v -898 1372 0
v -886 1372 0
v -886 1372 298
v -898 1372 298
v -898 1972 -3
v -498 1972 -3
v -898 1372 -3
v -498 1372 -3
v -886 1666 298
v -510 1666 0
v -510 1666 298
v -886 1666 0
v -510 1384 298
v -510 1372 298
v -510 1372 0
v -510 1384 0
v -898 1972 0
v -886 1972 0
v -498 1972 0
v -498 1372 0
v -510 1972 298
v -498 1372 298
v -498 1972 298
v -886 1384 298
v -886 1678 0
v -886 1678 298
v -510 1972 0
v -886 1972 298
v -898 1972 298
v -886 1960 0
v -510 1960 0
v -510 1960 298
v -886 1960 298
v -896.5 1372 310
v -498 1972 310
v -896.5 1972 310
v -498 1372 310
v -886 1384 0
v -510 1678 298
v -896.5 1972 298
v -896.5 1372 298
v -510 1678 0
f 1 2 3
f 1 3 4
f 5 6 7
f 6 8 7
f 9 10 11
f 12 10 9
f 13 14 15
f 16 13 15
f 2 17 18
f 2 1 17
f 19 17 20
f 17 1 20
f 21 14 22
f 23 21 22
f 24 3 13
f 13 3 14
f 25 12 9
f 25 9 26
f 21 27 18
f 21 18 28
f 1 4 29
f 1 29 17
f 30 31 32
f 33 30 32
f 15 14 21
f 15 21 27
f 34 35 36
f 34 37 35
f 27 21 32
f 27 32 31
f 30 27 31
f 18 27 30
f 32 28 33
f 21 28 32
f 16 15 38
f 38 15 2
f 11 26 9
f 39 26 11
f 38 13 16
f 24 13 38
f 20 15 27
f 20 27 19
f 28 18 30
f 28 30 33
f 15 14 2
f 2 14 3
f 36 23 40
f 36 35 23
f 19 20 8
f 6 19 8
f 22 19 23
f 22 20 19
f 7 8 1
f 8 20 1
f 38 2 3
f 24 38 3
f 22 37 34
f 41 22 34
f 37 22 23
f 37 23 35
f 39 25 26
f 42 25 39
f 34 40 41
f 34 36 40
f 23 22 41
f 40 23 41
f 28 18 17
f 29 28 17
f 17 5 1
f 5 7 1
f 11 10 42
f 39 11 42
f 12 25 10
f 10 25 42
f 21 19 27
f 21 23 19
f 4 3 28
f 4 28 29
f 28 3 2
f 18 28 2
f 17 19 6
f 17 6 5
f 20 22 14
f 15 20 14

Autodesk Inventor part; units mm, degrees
ref_plane "YZ Plane" through (0, 0, 0) normal (1, 0, 0) x (0, 1, 0)
sketch "Sketch1" plane through (0, 0, 0) normal (0, 0, 1) x (1, 0, 0)
  line L0 (-1498, 0) -> (1498, 0) construction
  line L1 (-1498, 0) -> (-898, 0)
  line L2 (-898, 0) -> (-898, 2068)
  line L3 (-898, 2068) -> (-1498, 2068)
  line L4 (-1498, 2068) -> (-1498, 0)
  line L5 (-898, 0) -> (-498, 0)
  line L6 (-498, 0) -> (-498, 816)
  line L7 (-498, 816) -> (-898, 816)
  line L8 (-898, 816) -> (-898, 0)
  line L9 (-498, 0) -> (102, 0)
  line L10 (102, 0) -> (102, 816)
  line L11 (102, 816) -> (-498, 816)
  line L12 (-498, 816) -> (-498, 0)
  line L13 (102, 0) -> (698, 0)
  line L14 (698, 0) -> (698, 668)
  line L15 (698, 668) -> (102, 668)
  line L16 (102, 668) -> (102, 0)
  line L17 (698, 0) -> (1498, 0)
  line L18 (1498, 0) -> (1498, 816)
  line L19 (1498, 816) -> (698, 816)
  line L20 (698, 816) -> (698, 0)
  line L21 (-1498, 0) -> (1498, 0)
  line L22 (1498, 0) -> (1498, 96)
  line L23 (1498, 96) -> (-1498, 96)
  line L24 (-1498, 96) -> (-1498, 0)
  line L25 (-898, 816) -> (1498, 816)
  line L26 (1498, 816) -> (1498, 832)
  line L27 (1498, 832) -> (-898, 832)
  line L28 (-898, 832) -> (-898, 816)
  line L29 (-898, 1972) -> (-498, 1972)
  line L30 (-498, 1972) -> (-498, 1372)
  line L31 (-498, 1372) -> (-898, 1372)
  line L32 (-898, 1372) -> (-898, 1972)
  line L33 (698, 1972) -> (1498, 1972)
  line L34 (1498, 1972) -> (1498, 1372)
  line L35 (1498, 1372) -> (698, 1372)
  line L36 (698, 1372) -> (698, 1972)
  line L37 (698, 1372) -> (98, 1372)
  line L38 (98, 1372) -> (98, 1972)
  line L39 (98, 1972) -> (698, 1972)
  line L40 (698, 1972) -> (698, 1372)
  line L41 (-498, 1372) -> (98, 1372)
  line L42 (-498, 1372) -> (-275, 1637.7611)
  line L43 (98, 1372) -> (-125, 1637.7611)
  line L44 (-275, 1637.7611) -> (-125, 1637.7611)
  line L45 (-125, 1637.7611) -> (-125, 2068)
  line L46 (-125, 2068) -> (-275, 2068)
  line L47 (-275, 2068) -> (-275, 1637.7611)
  line L48 (1098, 816) -> (1098, 96)
  line L49 (-198, 816) -> (-198, 96)
  line L50 (-898, 668) -> (-498, 668)
  line L51 (-1498, 520) -> (-898, 520)
  line L52 (-1498, 1579) -> (-898, 1579)
  line L53 (398, 1972) -> (398, 1372)
  line L54 (1098, 1972) -> (1098, 1372)
  line L55 (698, 1876) -> (1498, 1876)
  line L56 (698, 1468) -> (1498, 1468)
  line L57 (-1498, 1049.5) -> (-898, 1049.5)
  point P0 (0, 0)
  point P1 (0, 0)
  point P2 (0, 0)
  point P3 (-198, 816)
  point P4 (0, 0)
  dimension "d0" = 2996
  dimension "d1" = 600
  dimension "d2" = 2068
  dimension "d3" = 400
  dimension "d4" = 816
  dimension "d5" = 600
  dimension "d6" = 816
  dimension "d7" = 596
  dimension "d8" = 668
  dimension "d9" = 800
  dimension "d10" = 816
  dimension "d11" = 96
  dimension "d12" = 16
  dimension "d13" = 400
  dimension "d14" = 600
  dimension "d15" = 96
  dimension "d16" = 800
  dimension "d17" = 600
  dimension "d18" = 600
  dimension "d19" = 600
  dimension "d20" = 50
  dimension "d21" = 150
  dimension "d22" = 148
  dimension "d23" = 1059
  dimension "d24" = 96
  dimension "d25" = 96
  dimension "d26" = 529.5
ref_plane "Work Plane1" through (-498, 1372, 0) normal (0, 1, 0) x (-1, 0, 0)
sketch "Sketch2" plane through (-498, 1372, 0) normal (0, 1, 0) x (-1, 0, 0)
  line L0 (400, 0) -> (0, 0)
  line L1 (0, 0) -> (0, 310)
  line L2 (0, 310) -> (400, 310)
  line L3 (400, 310) -> (400, 0)
  line L4 (12, 12) -> (388, 12)
  line L5 (388, 12) -> (388, 298)
  line L6 (388, 298) -> (12, 298)
  line L7 (12, 298) -> (12, 12)
  line L8 (388, 12) -> (388, 0)
  line L9 (12, 12) -> (12, 0)
  line L10 (12, 298) -> (0, 298)
  line L11 (388, 298) -> (400, 298)
  point P0 (-498, 0)
  point P1 (0, 0)
  point P2 (0, 0)
  point P3 (0, 0)
  point P4 (400, 0)
  dimension "d28" = 400
  dimension "d29" = 310
  dimension "d30" = 12
extrude "Extrusion1" add sketch "Sketch2" along normal up to surface (600 mm away) contours L0 L8 L5 L11 L3 | L0 L1 L10 L7 L9
extrude "Extrusion2" add sketch "Sketch2" along normal up to surface (600 mm away) separate body contours L11 L6 L10 L1 L2 L3
sketch "Sketch3" plane through (-498, 1372, 0) normal (0, 1, 0) x (-1, 0, 0)
  line L0 (400, 298) -> (400, 0) projected
  line L1 (400, 0) -> (0, 0)
  line L2 (0, 0) -> (0, -3)
  line L3 (0, -3) -> (400, -3)
  line L4 (400, -3) -> (400, 0)
  point P0 (-498, 0)
  dimension "d35" = 3
extrude "Extrusion3" add sketch "Sketch3" along normal up to surface (600 mm away) separate body
sketch "Sketch4" plane through (-498, 1372, 0) normal (0, 1, 0) x (-1, 0, 0)
  line L0 (0, 0) -> (400, 0) projected
  line L1 (388, 0) -> (388, 298) projected
  line L2 (12, 298) -> (12, 0) projected
  line L3 (400, 298) -> (0, 298) projected
  point P0 (-498, 0)
extrude "Extrusion4" add sketch "Sketch4" along normal blind 12 separate body
ref_plane "Work Plane2" through (-498, 1972, 223.5) normal (0, -1, 0) x (0, 0, 1)
sketch "Sketch5" plane through (-498, 1972, 223.5) normal (0, -1, 0) x (0, 0, 1)
  line L0 (-223.5, 388) -> (74.5, 388) projected
  line L1 (74.5, 12) -> (-223.5, 12) projected
  line L2 (74.5, 400) -> (74.5, 0) projected
  line L3 (-223.5, 0) -> (-223.5, 400) projected
  point P0 (-223.5, -498)
extrude "Extrusion5" add sketch "Sketch5" along normal blind 12 separate body
sketch "Sketch6" plane through (-898, 1372, 0) normal (0, 0, 1) x (1, 0, 0)
  line L0 (12, 0) -> (12, 600) projected
  line L1 (388, 0) -> (388, 600) projected
  line L2 (12, 306) -> (388, 306)
  line L3 (388, 306) -> (388, 294)
  line L4 (388, 294) -> (12, 294)
  line L5 (12, 294) -> (12, 306)
  line L6 (12, 12) -> (388, 12) projected
  point P0 (898, -1372)
  point P1 (12, 294)
  point P2 (388, 306)
  dimension "d42" = 282
  dimension "d43" = 12
extrude "Extrusion6" add sketch "Sketch6" along normal up to surface (298 mm away) separate body contours L0 L2 L1 L4
sketch "Sketch7" plane through (-898, 1372, 310) normal (0, 0, 1) x (1, 0, 0)
  line L0 (0, 0) -> (400, 0) projected
  line L1 (0, 600) -> (1.5, 600)
  line L2 (1.5, 600) -> (1.5, 0)
  line L3 (1.5, 0) -> (0, 0)
  line L4 (0, 0) -> (0, 600)
  point P0 (898, -1372)
  dimension "d46" = 1.5
extrude "Extrusion7" cut sketch "Sketch7" against normal blind 12 bodies 2
properties part number "Wall Cabinet 1"
